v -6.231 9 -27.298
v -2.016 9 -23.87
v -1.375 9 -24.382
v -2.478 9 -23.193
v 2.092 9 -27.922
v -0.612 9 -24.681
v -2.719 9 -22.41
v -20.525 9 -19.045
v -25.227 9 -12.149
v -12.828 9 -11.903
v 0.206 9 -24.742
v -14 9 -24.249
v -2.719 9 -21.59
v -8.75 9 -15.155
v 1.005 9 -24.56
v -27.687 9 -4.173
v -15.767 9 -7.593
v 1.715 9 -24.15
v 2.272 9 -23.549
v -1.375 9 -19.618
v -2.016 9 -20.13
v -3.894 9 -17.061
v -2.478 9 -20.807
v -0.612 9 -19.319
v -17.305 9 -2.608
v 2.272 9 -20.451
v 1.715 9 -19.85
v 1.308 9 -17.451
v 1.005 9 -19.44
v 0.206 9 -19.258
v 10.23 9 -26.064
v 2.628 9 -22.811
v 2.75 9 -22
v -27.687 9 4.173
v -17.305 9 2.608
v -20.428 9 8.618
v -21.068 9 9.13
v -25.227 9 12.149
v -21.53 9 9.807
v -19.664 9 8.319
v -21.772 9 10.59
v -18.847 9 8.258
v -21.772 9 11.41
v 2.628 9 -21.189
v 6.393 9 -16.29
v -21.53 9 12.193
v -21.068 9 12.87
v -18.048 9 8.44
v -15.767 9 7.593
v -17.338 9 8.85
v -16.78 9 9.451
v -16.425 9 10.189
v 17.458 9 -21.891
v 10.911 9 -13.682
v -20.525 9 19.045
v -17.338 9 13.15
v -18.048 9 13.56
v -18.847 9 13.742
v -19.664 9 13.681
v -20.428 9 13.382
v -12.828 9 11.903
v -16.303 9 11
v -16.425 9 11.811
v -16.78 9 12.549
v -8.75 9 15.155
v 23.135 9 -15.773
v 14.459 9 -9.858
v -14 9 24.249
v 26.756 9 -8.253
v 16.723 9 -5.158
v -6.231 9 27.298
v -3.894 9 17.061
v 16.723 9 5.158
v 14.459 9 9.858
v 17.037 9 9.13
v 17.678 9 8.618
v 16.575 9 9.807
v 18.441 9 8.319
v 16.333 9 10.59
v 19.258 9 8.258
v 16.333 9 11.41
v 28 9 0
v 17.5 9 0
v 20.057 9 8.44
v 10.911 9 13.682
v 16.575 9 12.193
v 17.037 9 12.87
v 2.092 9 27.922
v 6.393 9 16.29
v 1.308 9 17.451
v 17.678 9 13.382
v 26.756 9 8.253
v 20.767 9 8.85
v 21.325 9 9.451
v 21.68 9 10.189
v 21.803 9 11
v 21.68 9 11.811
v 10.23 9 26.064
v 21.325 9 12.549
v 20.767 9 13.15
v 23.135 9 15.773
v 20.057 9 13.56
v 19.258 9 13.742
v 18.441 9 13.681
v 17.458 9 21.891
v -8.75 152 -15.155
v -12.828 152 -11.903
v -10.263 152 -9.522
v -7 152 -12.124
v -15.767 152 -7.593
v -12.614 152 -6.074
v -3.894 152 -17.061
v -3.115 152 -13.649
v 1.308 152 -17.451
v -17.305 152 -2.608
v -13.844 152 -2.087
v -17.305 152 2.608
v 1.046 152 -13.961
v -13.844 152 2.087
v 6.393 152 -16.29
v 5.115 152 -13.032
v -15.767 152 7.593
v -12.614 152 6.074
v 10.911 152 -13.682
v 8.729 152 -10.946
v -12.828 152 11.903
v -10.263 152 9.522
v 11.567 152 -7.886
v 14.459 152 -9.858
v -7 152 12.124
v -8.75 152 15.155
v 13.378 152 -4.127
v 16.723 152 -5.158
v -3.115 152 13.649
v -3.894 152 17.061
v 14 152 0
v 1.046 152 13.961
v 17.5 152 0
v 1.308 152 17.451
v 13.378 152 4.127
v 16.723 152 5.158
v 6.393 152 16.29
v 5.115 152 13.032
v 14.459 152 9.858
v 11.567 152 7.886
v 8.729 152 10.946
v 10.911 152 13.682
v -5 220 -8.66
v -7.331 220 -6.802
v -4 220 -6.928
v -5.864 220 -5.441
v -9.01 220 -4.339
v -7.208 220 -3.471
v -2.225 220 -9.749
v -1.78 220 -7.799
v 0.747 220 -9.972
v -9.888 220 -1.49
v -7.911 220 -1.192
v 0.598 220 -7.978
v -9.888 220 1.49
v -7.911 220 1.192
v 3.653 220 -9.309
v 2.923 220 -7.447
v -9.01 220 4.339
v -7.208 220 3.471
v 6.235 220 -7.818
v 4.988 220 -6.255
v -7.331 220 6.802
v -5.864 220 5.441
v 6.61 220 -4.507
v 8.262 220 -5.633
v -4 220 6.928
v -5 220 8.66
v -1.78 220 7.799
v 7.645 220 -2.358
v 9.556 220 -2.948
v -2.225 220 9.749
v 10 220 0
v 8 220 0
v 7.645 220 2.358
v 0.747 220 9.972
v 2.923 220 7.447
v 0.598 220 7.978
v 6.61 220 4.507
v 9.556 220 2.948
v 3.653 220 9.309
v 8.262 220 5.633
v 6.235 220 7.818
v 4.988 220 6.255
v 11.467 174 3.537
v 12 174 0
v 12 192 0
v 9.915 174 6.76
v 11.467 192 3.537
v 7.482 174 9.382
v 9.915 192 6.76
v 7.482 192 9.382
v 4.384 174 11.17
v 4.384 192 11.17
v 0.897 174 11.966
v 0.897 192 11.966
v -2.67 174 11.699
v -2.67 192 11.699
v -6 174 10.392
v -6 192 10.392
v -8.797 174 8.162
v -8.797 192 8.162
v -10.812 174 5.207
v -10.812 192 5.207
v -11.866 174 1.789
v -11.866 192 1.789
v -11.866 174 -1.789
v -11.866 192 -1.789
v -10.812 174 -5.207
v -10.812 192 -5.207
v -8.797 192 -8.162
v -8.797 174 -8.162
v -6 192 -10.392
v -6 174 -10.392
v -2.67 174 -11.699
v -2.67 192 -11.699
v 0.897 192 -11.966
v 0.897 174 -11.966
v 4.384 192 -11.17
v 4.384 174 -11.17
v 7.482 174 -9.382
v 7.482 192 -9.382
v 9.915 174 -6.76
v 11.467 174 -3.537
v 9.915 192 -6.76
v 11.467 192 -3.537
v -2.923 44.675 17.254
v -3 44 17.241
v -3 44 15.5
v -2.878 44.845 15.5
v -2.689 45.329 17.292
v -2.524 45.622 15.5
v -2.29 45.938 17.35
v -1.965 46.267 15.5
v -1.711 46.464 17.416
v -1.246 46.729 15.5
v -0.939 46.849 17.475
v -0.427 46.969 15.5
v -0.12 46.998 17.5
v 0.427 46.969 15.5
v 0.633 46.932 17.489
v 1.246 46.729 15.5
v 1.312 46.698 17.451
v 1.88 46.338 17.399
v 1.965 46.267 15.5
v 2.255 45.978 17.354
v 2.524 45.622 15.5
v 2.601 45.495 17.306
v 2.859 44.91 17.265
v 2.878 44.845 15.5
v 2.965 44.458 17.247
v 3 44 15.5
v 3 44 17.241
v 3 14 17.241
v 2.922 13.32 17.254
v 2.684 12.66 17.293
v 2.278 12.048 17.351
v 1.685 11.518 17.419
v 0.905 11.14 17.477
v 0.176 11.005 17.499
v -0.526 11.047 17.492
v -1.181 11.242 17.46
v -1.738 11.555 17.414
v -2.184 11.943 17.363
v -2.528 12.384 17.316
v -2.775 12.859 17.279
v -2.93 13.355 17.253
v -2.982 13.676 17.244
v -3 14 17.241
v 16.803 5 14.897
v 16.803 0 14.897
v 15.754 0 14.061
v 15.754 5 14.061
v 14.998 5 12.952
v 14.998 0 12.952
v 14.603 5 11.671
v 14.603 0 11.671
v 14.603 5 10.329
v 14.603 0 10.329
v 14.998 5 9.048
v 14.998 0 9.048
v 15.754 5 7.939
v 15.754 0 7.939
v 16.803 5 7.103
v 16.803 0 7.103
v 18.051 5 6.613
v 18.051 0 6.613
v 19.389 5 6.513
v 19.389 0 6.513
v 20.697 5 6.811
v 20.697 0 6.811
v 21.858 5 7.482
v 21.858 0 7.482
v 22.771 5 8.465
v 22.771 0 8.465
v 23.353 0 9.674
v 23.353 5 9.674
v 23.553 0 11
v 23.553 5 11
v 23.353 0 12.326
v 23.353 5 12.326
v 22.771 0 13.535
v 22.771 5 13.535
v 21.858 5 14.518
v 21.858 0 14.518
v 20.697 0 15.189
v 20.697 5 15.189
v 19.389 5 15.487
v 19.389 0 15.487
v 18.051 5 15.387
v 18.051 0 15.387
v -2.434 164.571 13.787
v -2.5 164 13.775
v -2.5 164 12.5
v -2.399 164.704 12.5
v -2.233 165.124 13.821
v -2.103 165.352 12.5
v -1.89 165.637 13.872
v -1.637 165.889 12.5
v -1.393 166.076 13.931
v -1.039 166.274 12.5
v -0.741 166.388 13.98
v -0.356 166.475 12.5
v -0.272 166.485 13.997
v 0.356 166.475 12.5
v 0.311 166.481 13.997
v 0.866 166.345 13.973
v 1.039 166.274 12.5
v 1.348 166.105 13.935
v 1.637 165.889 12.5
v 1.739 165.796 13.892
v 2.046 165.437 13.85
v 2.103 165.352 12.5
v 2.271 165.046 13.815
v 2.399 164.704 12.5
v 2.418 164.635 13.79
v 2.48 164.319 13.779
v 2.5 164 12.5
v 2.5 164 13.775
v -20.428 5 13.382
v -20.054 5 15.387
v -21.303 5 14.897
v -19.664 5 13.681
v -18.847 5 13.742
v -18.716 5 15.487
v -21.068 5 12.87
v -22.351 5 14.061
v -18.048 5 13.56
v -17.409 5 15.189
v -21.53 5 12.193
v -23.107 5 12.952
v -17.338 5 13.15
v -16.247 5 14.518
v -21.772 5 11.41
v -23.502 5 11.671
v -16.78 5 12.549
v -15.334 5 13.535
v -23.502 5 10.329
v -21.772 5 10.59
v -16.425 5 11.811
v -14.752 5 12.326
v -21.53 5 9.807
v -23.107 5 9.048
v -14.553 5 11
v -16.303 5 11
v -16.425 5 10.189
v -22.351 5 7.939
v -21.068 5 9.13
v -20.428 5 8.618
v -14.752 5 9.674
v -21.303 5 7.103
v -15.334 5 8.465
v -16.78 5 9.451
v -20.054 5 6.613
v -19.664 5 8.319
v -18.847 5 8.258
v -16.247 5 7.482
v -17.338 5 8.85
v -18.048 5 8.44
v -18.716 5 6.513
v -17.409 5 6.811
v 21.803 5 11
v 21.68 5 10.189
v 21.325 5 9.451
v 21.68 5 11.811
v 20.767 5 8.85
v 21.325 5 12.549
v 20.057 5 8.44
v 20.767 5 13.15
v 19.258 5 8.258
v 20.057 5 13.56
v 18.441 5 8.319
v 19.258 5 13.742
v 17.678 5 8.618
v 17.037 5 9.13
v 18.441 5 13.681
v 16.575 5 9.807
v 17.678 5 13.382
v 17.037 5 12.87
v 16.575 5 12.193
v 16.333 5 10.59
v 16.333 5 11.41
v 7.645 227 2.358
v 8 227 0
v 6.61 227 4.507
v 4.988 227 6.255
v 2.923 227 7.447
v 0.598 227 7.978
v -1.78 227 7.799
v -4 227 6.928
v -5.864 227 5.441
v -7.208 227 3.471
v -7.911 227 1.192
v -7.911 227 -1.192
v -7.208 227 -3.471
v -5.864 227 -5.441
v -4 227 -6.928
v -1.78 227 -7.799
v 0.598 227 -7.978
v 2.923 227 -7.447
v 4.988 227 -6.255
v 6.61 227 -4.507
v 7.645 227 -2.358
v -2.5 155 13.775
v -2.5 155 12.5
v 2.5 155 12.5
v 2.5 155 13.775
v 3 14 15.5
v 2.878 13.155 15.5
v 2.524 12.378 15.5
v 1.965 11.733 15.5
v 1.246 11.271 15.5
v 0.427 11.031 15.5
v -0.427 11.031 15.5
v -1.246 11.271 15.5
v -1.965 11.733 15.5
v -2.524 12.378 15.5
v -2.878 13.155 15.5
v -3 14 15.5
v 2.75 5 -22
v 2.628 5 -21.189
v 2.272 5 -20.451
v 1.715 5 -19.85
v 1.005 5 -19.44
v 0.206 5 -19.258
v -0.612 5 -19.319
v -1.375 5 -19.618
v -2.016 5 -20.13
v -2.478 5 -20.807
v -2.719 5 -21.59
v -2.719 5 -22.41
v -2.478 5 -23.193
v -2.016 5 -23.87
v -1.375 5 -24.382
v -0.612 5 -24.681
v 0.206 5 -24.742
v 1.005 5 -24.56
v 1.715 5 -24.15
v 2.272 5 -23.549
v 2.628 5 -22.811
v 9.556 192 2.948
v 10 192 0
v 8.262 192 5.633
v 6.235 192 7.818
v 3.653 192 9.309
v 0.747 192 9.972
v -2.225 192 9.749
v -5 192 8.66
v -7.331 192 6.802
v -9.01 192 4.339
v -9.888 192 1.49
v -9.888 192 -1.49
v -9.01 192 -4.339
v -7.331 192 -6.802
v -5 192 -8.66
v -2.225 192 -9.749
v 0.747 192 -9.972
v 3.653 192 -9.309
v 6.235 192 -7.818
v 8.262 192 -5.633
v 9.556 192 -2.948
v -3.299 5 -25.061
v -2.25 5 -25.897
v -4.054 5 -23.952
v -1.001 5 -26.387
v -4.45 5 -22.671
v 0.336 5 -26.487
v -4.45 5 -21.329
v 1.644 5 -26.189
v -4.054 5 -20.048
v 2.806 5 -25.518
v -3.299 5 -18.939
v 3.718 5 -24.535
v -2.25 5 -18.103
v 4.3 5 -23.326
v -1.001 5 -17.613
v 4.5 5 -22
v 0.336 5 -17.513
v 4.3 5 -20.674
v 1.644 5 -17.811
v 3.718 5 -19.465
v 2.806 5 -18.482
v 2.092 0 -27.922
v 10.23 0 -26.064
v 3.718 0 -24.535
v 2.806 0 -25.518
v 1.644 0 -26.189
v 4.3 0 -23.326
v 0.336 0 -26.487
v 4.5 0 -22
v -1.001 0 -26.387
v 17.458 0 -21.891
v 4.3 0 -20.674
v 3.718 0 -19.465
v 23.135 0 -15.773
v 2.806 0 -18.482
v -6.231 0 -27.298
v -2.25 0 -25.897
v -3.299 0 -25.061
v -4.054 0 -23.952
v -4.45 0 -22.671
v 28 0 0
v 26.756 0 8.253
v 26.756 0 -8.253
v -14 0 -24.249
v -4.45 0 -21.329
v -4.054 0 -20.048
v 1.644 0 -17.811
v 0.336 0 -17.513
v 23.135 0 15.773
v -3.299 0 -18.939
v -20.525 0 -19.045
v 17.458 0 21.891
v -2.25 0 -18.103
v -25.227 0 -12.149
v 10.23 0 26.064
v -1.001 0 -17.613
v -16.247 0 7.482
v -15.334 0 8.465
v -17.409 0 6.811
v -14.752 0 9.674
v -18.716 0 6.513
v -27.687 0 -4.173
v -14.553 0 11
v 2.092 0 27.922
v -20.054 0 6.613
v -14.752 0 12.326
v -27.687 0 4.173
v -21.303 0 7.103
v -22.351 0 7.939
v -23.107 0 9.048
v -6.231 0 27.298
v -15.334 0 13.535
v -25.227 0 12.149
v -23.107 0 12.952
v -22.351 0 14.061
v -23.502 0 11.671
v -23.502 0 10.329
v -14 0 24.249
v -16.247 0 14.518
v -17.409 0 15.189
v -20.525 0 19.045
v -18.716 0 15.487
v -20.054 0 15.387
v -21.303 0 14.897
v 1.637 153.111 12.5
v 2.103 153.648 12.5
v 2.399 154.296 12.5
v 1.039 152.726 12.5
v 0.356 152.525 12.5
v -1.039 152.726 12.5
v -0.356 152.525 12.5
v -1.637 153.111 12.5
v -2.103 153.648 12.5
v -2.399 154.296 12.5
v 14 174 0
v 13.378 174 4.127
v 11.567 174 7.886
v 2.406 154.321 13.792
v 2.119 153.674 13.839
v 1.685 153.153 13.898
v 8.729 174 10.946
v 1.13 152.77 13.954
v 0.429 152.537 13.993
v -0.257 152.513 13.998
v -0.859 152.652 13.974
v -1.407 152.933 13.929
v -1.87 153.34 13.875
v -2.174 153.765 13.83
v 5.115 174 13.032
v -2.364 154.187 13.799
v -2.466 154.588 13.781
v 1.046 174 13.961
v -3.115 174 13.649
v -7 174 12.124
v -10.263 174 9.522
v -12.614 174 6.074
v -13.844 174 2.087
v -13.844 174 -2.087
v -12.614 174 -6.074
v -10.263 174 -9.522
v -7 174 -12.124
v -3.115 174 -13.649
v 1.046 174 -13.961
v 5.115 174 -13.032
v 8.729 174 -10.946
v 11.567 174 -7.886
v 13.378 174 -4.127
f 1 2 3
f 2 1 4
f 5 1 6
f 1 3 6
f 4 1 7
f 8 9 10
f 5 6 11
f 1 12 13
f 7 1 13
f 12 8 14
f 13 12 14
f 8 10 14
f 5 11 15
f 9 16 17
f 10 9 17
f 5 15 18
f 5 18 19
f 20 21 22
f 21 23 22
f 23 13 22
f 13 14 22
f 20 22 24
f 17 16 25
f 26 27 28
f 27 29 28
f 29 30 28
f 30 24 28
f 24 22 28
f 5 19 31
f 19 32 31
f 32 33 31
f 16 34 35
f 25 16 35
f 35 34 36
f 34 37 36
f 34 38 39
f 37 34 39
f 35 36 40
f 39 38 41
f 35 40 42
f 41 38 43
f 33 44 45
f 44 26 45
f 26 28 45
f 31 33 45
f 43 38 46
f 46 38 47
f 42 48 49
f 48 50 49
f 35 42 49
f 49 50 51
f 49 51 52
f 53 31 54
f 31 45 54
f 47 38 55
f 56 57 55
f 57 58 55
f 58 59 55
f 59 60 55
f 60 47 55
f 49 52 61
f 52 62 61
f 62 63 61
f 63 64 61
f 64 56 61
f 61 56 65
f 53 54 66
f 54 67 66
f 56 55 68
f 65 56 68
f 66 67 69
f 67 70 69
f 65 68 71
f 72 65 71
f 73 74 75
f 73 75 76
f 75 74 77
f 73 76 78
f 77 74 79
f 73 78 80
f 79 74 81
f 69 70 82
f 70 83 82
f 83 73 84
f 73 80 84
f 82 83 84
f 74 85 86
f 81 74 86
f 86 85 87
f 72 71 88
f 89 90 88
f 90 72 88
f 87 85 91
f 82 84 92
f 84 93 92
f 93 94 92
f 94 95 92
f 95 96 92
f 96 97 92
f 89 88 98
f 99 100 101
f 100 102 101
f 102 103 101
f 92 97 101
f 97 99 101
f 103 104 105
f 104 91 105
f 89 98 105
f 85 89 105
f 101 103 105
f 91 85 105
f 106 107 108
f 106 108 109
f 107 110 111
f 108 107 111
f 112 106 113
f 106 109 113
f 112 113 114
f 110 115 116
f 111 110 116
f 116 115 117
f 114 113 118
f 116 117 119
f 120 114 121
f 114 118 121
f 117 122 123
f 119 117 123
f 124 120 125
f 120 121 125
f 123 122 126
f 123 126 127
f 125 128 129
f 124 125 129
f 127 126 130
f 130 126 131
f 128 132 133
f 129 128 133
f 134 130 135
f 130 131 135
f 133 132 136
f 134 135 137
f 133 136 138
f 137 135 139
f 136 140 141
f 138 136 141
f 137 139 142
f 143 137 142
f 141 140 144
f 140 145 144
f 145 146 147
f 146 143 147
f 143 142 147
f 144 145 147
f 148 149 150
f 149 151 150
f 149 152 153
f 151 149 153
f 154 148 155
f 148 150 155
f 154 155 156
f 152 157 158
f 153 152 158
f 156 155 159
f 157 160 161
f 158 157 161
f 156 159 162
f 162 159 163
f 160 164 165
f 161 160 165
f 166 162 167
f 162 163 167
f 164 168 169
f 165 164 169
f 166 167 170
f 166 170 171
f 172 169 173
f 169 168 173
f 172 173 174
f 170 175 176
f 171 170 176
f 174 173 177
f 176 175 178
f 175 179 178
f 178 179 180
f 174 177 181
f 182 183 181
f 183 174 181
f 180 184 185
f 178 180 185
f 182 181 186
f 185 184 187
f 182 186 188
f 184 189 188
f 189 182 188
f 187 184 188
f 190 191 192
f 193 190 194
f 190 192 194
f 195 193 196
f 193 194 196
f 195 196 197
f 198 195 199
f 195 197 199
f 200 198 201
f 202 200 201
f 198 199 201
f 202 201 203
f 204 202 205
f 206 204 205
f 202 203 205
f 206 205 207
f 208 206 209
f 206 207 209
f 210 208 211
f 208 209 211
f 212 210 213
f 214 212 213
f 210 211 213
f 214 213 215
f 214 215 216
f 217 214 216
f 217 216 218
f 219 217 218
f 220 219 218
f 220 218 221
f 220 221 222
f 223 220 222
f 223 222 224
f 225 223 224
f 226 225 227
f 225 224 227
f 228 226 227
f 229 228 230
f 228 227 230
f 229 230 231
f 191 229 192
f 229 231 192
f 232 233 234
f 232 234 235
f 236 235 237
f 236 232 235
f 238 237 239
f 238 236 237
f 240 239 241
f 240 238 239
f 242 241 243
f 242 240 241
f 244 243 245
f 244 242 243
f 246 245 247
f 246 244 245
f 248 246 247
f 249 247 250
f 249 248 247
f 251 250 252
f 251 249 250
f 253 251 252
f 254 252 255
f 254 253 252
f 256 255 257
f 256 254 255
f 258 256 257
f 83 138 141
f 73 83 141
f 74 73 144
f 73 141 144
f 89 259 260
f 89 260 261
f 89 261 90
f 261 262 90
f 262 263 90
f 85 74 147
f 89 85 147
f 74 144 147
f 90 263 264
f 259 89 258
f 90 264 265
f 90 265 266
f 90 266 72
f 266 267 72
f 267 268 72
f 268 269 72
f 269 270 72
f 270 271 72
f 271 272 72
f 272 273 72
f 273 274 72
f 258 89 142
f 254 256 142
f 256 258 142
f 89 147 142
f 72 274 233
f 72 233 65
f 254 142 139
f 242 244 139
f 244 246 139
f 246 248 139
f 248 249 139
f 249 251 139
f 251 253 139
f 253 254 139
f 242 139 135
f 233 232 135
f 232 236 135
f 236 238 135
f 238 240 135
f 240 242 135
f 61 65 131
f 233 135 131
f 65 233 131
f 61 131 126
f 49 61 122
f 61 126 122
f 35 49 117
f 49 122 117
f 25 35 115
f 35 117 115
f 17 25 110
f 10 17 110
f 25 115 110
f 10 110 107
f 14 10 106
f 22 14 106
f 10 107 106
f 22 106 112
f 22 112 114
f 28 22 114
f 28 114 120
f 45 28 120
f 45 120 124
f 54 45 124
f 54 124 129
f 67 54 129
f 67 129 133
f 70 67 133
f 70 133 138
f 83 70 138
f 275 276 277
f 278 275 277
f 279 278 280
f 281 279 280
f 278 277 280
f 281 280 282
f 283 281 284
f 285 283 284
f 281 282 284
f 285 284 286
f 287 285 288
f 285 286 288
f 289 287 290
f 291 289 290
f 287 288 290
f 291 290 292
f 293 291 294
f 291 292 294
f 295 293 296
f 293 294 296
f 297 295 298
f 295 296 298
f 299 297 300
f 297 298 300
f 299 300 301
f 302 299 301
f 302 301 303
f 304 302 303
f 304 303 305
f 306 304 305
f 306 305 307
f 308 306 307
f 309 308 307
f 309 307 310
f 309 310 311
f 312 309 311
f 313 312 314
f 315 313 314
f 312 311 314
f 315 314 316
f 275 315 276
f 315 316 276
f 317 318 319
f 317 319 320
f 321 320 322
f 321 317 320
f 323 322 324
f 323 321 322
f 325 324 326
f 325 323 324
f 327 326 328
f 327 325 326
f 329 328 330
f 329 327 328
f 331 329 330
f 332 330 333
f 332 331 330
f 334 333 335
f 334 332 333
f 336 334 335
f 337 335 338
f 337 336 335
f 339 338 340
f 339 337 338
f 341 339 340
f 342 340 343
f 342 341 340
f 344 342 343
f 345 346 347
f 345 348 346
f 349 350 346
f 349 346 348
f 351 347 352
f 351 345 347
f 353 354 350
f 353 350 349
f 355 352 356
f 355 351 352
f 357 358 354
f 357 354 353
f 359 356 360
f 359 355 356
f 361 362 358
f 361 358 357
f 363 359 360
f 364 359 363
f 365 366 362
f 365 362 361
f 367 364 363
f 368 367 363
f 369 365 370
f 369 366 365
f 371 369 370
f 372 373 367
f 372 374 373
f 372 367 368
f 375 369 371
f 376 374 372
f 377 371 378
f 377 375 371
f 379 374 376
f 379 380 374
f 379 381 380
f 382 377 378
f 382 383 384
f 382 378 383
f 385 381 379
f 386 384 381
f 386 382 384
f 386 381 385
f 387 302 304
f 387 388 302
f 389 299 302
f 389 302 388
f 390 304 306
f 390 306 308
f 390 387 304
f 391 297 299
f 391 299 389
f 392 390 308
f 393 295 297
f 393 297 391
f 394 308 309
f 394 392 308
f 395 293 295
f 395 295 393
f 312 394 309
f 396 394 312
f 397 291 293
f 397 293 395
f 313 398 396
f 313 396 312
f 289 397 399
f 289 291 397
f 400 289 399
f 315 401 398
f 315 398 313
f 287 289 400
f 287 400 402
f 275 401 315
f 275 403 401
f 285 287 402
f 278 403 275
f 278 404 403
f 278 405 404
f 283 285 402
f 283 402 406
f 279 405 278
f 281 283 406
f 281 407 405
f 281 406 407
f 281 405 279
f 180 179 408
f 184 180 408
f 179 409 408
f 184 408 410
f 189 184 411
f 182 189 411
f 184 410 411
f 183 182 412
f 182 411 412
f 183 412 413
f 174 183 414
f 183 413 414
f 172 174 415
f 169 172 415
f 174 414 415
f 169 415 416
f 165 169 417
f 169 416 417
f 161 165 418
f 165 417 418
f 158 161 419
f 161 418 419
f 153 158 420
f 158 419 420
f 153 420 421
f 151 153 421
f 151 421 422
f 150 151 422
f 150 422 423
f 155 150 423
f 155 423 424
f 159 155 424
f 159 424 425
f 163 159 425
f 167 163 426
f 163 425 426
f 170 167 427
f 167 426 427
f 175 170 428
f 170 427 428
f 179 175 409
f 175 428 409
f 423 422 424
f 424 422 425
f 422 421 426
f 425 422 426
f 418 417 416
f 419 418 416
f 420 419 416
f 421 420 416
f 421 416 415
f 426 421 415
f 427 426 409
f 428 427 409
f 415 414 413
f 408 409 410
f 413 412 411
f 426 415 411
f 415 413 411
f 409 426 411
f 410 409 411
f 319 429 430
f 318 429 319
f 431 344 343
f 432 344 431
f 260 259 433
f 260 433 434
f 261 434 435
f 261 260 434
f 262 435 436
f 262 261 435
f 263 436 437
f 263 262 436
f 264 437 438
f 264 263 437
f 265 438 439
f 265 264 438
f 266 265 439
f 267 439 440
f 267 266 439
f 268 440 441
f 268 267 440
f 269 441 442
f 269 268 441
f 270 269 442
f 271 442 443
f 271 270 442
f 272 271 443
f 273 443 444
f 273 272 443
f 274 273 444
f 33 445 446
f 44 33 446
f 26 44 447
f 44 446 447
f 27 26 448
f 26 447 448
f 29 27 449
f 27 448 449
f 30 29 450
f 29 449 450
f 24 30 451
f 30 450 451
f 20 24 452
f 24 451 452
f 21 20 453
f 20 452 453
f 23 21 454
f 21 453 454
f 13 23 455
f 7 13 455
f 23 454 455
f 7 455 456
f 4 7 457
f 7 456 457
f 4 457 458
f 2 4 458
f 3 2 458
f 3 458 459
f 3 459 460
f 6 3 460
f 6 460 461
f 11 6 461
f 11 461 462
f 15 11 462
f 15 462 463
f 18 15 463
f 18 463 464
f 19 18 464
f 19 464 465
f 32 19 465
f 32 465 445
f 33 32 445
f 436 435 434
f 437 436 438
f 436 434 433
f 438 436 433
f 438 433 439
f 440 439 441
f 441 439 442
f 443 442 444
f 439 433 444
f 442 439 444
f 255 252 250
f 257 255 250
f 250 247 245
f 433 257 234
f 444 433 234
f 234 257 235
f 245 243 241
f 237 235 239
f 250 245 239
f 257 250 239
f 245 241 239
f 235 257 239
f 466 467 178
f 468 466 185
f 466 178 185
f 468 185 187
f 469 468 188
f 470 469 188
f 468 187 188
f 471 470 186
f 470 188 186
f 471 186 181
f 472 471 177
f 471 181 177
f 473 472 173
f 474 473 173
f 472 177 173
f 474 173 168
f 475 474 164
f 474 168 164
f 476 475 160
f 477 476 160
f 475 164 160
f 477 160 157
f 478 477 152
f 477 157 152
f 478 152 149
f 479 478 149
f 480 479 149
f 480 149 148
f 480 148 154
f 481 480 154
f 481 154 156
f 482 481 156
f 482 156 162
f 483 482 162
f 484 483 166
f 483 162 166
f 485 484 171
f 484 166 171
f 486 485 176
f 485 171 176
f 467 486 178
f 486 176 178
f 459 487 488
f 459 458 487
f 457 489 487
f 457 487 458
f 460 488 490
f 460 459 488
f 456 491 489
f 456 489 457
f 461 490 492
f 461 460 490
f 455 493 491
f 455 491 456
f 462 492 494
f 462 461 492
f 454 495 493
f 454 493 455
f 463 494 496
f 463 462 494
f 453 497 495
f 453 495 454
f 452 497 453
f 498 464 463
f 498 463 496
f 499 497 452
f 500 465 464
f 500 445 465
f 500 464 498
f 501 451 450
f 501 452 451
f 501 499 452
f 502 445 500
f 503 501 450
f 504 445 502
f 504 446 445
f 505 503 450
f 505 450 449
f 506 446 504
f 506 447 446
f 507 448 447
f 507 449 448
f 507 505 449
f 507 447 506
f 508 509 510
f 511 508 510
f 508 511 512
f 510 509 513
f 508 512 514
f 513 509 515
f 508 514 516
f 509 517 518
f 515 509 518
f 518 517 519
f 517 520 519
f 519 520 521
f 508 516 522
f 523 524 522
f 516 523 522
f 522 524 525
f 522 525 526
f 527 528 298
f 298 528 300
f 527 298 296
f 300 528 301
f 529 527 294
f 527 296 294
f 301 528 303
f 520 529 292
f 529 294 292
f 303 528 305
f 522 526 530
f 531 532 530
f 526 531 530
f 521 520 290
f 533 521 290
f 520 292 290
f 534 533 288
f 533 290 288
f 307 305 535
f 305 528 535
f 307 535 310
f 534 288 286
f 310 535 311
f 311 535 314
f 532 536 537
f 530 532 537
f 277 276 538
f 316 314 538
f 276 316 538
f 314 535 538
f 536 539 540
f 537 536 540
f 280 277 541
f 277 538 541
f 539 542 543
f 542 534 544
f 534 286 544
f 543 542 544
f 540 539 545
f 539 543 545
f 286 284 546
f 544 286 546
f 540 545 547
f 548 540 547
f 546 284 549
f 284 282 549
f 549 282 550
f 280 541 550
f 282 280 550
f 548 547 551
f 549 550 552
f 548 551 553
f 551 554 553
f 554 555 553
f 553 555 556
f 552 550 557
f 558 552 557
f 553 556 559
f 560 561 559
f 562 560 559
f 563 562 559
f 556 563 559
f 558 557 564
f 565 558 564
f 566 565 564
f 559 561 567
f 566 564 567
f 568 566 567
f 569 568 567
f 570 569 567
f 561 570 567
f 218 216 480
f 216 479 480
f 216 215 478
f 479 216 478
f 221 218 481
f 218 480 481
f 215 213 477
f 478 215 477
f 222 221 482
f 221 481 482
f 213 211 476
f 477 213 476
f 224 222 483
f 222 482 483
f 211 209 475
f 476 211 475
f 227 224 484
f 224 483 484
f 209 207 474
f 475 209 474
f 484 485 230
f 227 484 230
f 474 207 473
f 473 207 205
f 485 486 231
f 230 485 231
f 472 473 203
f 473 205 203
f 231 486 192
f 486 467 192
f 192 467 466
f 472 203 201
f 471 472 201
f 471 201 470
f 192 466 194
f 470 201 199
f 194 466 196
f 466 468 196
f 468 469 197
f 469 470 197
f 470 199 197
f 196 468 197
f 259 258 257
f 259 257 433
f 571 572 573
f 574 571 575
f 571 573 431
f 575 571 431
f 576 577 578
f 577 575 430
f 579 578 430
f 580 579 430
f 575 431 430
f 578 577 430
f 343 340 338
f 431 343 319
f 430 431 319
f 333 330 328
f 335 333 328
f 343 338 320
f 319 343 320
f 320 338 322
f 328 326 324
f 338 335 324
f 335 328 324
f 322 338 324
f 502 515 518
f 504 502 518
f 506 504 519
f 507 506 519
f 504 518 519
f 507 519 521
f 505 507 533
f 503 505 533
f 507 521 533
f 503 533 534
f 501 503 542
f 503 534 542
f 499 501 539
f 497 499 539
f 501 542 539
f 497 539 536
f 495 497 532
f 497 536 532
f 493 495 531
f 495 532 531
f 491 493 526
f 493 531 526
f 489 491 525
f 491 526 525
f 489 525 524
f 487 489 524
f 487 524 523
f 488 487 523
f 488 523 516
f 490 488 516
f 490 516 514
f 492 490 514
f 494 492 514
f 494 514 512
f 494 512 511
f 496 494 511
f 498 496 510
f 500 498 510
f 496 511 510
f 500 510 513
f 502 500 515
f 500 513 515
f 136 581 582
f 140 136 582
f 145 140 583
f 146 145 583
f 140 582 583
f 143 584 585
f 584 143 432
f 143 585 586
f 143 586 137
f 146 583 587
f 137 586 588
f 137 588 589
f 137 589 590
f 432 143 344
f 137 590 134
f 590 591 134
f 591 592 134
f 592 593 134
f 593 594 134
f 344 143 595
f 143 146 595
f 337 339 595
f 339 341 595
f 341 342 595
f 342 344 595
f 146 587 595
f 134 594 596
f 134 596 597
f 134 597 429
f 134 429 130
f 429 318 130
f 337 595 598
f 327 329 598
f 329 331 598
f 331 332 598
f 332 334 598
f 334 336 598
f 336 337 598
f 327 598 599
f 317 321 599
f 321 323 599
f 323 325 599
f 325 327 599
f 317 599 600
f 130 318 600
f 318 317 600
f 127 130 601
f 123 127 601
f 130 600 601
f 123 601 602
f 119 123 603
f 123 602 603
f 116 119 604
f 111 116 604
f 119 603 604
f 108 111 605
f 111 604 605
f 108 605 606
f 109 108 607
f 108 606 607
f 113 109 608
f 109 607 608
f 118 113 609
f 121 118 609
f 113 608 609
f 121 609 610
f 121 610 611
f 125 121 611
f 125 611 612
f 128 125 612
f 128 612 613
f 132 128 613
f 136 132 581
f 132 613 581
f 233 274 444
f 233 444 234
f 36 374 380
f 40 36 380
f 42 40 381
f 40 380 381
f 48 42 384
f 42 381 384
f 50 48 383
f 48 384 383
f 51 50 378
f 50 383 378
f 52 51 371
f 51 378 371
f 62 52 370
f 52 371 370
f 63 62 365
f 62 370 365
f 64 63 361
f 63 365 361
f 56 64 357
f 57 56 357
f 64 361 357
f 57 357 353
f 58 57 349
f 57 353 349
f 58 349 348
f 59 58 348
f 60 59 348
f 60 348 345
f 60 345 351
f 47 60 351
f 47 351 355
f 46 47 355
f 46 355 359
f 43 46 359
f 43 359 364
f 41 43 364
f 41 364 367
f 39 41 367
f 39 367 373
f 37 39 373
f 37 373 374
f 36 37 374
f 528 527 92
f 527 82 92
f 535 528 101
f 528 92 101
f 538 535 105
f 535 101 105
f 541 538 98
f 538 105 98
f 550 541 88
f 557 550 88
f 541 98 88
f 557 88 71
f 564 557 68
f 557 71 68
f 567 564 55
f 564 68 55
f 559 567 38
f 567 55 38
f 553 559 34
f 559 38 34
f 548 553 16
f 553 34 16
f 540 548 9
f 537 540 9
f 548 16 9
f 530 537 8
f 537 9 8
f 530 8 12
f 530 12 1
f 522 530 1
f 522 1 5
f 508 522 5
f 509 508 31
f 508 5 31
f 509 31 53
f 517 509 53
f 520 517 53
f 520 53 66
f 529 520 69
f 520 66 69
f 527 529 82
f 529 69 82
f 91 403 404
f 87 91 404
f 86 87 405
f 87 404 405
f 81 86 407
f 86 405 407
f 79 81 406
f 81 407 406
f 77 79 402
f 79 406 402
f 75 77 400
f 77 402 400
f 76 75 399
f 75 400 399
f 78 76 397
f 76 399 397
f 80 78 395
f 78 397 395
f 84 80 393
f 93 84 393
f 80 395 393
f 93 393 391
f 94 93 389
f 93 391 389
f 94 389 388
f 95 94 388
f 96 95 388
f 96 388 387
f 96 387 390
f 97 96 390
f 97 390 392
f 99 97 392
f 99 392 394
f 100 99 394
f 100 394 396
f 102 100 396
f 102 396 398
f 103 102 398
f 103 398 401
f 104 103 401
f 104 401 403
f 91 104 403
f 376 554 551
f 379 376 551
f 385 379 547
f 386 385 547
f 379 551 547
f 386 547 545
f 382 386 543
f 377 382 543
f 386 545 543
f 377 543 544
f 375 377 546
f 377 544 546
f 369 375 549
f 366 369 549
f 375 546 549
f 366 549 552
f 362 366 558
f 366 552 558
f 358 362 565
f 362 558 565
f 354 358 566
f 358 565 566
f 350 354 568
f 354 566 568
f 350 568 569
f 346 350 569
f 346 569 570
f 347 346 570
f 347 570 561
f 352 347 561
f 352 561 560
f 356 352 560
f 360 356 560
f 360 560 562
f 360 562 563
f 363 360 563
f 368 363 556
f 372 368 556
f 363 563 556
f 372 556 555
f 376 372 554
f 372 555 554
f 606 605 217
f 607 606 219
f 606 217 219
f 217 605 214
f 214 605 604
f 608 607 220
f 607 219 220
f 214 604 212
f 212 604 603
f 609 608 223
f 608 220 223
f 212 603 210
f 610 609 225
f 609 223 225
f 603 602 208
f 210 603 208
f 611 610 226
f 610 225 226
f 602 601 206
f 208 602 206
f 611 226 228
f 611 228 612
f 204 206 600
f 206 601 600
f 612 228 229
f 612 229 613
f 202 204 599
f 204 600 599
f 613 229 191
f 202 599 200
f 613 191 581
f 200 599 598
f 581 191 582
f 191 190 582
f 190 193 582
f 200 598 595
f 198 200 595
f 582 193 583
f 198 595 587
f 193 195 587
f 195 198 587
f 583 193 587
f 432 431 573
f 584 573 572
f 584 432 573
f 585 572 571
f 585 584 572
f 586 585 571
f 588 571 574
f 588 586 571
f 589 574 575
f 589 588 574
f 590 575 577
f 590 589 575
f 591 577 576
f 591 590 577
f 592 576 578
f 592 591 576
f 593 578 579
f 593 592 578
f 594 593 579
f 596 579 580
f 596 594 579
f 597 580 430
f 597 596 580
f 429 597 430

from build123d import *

# Parameters (mm, degrees)
CUT_EXTRUDE1_DEPTH = 2
CUT_EXTRUDE2_DEPTH = 1.5
SKETCH7_R          = 2.75
CUT_EXTRUDE3_DEPTH = 9
SKETCH8_R          = 4.5
CUT_EXTRUDE4_DEPTH = 5
CIRPATTERN1_COUNT  = 3
CIRPATTERN2_COUNT  = 3


with BuildPart() as part:
    # Sketch1 → Revolve1 (revolve)
    with BuildSketch(Plane.XY):
        Polygon((0, 0), (28, 0), (28, 9), (17.5, 9), (17.5, 152), (14, 152), (14, 174), (12, 174), (12, 192), (10, 192), (10, 220), (8, 220), (8, 227), (0, 227), align=None)
    revolve(axis=Axis((0, 340.077659461, 0), (0, -1, 0)))

    # Sketch2 → Cut-Extrude1 (cut)
    with BuildSketch(Plane.XY.offset(17.5)):
        with BuildLine():
            Line((3, 44), (3, 14))
            ThreePointArc((3, 14), (0, 11), (-3, 14))
            Line((-3, 14), (-3, 44))
            ThreePointArc((-3, 44), (0, 47), (3, 44))
        make_face()
    extrude(amount=-CUT_EXTRUDE1_DEPTH, mode=Mode.SUBTRACT)

    # Sketch3 → Cut-Extrude2 (cut)
    with BuildSketch(Plane.XY.offset(14)):
        with BuildLine():
            Line((2.5, 164), (2.5, 155))
            ThreePointArc((2.5, 155), (0, 152.5), (-2.5, 155))
            Line((-2.5, 155), (-2.5, 164))
            ThreePointArc((-2.5, 164), (0, 166.5), (2.5, 164))
        make_face()
    extrude(amount=-CUT_EXTRUDE2_DEPTH, mode=Mode.SUBTRACT)

    # Sketch7 → Cut-Extrude3 (cut)
    with BuildSketch(Plane.XZ):
        with Locations((0, -22)):
            Circle(SKETCH7_R)
    cut_extrude3 = extrude(amount=-CUT_EXTRUDE3_DEPTH, mode=Mode.SUBTRACT)

    # Sketch8 → Cut-Extrude4 (cut)
    with BuildSketch(Plane.XZ):
        with Locations((0, -22)):
            Circle(SKETCH8_R)
    cut_extrude4 = extrude(amount=-CUT_EXTRUDE4_DEPTH, mode=Mode.SUBTRACT)

    # CirPattern1: Cut-Extrude3 ×3 about axis
    cirpattern1_axis = Axis((0, 0, 0), (0, 1, 0))
    for i in range(1, CIRPATTERN1_COUNT):
        add(cut_extrude3.rotate(cirpattern1_axis, i * 360 / CIRPATTERN1_COUNT), mode=Mode.SUBTRACT)

    # CirPattern2: Cut-Extrude4 ×3 about axis
    cirpattern2_axis = Axis((0, 0, 0), (0, 1, 0))
    for i in range(1, CIRPATTERN2_COUNT):
        add(cut_extrude4.rotate(cirpattern2_axis, i * 360 / CIRPATTERN2_COUNT), mode=Mode.SUBTRACT)


solid = part.part
